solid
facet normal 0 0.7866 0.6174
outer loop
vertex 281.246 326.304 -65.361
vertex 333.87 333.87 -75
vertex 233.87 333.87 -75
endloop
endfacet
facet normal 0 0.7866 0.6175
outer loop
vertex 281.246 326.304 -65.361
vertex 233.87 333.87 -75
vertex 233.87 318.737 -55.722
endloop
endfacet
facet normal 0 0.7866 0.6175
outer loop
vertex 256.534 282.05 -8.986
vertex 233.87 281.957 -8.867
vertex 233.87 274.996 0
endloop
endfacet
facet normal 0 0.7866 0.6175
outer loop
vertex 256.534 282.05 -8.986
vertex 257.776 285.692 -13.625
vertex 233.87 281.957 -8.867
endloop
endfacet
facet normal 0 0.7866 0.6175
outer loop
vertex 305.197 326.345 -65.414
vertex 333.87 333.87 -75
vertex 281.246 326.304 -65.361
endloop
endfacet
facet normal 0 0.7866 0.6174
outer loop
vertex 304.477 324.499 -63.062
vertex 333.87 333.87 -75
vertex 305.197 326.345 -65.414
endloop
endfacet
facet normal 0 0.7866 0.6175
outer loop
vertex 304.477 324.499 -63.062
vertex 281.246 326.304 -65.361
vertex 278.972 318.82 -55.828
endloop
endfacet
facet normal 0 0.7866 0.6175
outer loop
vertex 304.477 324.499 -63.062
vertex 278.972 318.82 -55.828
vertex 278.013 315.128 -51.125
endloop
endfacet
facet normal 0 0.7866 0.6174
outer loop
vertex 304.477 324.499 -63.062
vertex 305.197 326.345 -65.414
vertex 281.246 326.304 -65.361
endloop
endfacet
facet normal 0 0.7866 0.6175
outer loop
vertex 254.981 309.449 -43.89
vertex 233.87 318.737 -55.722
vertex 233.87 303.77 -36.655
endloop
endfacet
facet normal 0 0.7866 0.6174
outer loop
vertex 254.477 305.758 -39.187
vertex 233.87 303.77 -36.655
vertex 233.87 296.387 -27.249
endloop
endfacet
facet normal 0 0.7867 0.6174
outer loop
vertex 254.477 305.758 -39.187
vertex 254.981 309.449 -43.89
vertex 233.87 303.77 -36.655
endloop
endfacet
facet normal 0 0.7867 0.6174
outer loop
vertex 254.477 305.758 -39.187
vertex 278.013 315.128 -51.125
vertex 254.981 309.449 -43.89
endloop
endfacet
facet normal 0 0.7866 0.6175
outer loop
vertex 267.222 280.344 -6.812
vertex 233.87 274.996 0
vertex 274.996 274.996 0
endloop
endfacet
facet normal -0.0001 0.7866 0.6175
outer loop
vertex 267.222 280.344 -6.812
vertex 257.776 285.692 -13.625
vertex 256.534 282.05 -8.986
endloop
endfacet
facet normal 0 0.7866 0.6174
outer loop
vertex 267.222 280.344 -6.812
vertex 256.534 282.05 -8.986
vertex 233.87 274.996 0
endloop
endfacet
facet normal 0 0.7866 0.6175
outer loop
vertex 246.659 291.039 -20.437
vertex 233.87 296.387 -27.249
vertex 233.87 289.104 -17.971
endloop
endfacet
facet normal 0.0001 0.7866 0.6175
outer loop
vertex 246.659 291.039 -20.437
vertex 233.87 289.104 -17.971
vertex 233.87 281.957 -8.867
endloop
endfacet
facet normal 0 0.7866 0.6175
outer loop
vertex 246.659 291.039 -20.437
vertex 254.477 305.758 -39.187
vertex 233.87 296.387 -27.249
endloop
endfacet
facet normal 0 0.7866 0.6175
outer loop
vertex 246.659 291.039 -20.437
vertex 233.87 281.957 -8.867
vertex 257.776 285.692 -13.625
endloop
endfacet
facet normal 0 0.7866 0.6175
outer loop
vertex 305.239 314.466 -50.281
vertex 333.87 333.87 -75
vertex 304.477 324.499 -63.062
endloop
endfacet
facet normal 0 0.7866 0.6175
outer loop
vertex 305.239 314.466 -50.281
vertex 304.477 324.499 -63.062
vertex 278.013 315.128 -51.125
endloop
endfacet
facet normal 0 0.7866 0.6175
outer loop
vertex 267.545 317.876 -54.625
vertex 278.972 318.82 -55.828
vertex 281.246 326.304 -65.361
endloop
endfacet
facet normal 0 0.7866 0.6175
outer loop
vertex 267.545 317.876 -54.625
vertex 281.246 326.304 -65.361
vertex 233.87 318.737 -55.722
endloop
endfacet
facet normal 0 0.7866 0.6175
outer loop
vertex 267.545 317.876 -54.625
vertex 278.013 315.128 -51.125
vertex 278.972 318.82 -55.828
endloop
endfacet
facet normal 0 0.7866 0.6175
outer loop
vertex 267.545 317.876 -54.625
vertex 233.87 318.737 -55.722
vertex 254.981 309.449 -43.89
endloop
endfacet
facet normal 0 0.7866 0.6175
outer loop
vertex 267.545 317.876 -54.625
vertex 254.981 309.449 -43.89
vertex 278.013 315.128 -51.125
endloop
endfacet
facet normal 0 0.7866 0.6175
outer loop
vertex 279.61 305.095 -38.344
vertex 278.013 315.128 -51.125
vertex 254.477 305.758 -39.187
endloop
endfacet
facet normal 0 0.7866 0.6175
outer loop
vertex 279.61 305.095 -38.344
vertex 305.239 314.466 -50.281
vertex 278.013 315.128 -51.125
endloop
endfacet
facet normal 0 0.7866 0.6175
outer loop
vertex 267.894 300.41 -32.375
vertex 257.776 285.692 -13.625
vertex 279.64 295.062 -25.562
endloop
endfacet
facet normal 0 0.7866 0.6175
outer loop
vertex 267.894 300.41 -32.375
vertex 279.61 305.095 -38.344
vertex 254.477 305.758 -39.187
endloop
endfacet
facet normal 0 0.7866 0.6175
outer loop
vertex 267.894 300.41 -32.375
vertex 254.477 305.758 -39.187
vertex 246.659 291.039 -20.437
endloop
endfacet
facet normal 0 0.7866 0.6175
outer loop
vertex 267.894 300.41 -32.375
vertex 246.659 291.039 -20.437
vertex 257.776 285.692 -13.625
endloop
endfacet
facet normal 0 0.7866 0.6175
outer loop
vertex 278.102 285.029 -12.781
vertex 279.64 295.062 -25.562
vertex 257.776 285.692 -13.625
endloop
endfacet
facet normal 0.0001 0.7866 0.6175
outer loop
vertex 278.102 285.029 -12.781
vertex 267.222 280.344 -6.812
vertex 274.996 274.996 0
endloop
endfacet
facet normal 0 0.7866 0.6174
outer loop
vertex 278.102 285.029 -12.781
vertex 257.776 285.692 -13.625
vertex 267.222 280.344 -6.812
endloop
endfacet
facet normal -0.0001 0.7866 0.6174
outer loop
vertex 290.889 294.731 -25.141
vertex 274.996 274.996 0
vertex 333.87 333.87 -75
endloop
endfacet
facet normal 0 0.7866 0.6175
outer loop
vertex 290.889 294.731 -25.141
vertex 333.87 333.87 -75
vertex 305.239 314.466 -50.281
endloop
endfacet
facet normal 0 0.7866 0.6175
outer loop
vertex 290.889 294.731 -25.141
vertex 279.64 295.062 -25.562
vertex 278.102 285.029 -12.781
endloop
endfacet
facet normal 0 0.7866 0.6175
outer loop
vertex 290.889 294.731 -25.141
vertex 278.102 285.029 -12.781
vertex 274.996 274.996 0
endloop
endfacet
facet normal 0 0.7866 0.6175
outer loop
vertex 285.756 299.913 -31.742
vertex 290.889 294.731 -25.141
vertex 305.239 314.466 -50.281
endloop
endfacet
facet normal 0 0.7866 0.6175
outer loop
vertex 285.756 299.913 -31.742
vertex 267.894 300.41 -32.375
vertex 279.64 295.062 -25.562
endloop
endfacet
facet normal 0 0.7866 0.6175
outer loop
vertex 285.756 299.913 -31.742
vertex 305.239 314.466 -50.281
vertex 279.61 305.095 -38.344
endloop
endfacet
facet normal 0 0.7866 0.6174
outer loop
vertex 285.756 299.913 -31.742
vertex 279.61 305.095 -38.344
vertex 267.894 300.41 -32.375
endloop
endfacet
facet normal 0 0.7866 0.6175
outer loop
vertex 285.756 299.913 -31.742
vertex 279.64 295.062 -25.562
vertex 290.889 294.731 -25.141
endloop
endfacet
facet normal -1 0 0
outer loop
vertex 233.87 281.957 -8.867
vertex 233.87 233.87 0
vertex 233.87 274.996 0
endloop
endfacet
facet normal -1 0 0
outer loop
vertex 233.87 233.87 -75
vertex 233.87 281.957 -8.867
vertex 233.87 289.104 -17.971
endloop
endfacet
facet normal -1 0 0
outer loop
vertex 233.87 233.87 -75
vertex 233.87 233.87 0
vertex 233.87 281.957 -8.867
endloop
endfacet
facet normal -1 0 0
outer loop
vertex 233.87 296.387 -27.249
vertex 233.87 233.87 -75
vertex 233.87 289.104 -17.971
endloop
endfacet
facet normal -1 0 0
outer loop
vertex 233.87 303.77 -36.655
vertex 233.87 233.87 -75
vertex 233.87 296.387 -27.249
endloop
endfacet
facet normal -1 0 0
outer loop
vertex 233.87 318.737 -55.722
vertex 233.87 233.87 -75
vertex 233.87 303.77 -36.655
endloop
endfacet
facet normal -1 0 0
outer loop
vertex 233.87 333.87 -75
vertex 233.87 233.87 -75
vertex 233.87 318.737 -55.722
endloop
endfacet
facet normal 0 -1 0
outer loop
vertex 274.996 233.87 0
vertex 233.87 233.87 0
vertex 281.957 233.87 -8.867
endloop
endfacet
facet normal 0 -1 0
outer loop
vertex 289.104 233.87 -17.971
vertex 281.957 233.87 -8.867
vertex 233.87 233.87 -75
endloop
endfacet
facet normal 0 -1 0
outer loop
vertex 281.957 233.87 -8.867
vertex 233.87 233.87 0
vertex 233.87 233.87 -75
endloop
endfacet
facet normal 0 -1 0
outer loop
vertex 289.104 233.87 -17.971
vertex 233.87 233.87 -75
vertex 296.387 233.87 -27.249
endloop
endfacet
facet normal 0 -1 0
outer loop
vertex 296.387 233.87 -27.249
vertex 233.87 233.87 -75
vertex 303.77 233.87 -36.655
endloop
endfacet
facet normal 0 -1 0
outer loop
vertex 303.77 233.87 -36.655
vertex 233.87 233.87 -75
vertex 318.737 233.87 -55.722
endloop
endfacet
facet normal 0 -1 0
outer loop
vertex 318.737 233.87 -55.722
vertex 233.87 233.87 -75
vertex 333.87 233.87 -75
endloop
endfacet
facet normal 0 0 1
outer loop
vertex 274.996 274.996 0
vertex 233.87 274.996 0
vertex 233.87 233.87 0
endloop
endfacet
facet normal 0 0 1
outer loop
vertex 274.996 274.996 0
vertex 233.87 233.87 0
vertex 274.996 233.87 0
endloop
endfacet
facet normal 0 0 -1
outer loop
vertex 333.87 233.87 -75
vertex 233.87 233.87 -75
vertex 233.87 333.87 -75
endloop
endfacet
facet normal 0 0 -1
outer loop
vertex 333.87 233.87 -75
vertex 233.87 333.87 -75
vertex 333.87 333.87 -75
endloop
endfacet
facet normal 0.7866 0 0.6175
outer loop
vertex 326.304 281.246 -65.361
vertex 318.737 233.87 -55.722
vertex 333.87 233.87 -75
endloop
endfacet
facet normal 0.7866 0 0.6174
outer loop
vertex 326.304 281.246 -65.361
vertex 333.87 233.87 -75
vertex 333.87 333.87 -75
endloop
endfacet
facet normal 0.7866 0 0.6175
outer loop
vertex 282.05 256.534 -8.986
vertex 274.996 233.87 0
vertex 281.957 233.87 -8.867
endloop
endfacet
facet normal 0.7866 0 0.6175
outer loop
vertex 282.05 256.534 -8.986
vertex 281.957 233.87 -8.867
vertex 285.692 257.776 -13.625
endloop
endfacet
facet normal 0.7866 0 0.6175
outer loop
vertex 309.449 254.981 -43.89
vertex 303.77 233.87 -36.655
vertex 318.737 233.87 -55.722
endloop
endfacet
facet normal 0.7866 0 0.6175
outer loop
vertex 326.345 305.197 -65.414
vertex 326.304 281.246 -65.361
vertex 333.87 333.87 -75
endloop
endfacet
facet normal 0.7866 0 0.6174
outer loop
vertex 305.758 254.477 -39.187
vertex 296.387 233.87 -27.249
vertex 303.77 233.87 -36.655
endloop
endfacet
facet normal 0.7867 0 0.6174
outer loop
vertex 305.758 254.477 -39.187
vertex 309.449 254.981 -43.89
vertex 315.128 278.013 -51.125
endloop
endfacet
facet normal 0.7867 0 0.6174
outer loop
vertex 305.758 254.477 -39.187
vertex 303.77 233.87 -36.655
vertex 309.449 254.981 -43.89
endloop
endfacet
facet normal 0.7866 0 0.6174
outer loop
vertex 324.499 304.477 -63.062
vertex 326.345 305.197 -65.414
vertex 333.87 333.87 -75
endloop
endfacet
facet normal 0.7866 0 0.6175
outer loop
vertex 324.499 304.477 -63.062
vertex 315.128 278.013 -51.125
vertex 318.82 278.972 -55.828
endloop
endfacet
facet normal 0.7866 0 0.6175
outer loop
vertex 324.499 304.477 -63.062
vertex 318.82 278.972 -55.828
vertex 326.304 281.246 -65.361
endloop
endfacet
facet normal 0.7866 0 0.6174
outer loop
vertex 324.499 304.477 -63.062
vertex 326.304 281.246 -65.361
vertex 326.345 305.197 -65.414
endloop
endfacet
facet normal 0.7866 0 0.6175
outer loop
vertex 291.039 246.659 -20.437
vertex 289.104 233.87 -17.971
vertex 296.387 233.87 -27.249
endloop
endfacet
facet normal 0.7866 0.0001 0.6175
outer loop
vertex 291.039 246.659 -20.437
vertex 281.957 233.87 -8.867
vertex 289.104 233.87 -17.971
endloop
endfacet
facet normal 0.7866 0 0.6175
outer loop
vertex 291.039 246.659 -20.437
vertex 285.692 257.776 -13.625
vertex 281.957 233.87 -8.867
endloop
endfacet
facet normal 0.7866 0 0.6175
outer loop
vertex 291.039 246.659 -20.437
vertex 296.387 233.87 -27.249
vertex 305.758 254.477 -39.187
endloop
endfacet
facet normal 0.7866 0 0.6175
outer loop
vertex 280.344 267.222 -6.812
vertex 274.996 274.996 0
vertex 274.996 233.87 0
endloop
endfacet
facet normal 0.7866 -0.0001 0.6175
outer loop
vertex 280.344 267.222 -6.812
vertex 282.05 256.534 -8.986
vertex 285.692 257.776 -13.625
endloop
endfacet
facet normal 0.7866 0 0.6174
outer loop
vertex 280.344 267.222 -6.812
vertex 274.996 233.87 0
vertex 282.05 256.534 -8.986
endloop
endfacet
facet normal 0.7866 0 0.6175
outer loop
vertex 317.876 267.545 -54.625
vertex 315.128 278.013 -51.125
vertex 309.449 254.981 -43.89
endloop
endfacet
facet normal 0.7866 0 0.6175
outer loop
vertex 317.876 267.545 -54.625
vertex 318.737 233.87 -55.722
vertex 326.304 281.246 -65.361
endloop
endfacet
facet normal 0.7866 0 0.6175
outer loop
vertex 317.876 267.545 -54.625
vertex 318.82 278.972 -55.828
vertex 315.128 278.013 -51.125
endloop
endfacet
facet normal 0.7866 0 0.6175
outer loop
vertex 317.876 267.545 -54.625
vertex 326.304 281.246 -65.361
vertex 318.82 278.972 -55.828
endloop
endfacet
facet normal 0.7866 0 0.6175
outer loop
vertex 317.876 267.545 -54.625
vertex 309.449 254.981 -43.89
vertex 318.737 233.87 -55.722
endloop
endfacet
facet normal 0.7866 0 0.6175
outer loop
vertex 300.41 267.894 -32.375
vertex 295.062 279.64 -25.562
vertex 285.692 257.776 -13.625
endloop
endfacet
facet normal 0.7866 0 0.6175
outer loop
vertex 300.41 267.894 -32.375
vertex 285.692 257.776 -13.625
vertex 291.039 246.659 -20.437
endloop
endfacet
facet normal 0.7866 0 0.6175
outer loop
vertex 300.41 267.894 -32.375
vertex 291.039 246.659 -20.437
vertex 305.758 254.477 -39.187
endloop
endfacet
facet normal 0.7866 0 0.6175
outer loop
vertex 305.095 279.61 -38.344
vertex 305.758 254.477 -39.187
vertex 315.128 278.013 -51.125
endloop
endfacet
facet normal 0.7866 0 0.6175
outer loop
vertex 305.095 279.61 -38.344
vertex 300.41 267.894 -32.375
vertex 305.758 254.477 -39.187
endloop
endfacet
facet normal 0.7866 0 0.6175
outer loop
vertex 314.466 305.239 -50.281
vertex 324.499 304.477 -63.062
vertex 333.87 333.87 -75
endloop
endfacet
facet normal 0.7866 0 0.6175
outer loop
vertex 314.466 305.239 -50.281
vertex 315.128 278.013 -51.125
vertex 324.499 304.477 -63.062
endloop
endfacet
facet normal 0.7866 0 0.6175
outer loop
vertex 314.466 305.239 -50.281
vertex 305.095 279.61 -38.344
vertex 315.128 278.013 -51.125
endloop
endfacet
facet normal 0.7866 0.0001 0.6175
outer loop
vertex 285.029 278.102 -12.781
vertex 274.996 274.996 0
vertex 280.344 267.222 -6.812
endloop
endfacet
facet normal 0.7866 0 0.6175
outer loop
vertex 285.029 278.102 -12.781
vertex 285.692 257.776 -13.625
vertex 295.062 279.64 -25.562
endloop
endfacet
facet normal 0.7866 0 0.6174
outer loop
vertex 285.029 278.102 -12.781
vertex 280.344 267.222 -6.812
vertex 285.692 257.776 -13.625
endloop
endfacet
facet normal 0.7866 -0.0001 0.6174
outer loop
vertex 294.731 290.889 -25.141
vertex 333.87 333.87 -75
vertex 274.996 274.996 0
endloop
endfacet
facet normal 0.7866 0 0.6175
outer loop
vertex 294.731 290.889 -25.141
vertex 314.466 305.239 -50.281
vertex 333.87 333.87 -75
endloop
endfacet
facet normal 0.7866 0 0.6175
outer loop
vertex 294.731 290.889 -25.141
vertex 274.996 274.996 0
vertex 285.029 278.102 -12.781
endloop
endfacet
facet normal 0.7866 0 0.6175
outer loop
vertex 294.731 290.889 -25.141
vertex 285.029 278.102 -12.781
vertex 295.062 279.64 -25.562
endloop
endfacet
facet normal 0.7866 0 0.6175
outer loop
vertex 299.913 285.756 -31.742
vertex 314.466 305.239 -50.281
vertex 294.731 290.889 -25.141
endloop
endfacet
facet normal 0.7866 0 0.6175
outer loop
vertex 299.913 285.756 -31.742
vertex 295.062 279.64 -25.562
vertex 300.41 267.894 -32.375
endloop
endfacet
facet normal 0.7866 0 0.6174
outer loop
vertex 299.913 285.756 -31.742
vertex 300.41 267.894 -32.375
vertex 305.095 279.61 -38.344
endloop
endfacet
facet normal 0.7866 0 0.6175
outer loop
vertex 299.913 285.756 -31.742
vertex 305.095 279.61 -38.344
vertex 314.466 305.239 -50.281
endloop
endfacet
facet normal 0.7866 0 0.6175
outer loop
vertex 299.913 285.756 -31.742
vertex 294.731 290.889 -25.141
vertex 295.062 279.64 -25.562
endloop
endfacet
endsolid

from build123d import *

# Parameters (mm, degrees)
BOX020_W     = 100
BOX020_H     = 100
BOX020_DEPTH = 75
SKETCH054_W  = 275
SKETCH054_H  = 275
SKETCH055_W  = 0.1
SKETCH055_H  = 0.1


with BuildPart() as cube002:
    # Box020 → Box020 (new body)
    with BuildSketch(Plane(origin=(175, 175, 0), x_dir=(1, 0, 0), z_dir=(0, 0, 1))):
        with Locations((50, 50)):
            Rectangle(BOX020_W, BOX020_H)
    extrude(amount=BOX020_DEPTH)


with BuildPart() as legs003:
    # Sketch054 → Loft019 section 0
    with BuildSketch(Plane.XY):
        with Locations((137.5, 137.5)):
            Rectangle(SKETCH054_W, SKETCH054_H)
    # Sketch055 → Loft019 section 1
    with BuildSketch(Plane.XY.offset(175.1)):
        with Locations((137.5, 137.5)):
            Rectangle(SKETCH055_W, SKETCH055_H)
    loft()

    # Common014: intersect Cube002
    add(cube002.part, mode=Mode.INTERSECT)


with BuildPart() as legs003_1:
    # Common014 placement: moved
    add(legs003.part.moved(Location((58.87, 58.87, -75))))


solid = legs003_1.part
